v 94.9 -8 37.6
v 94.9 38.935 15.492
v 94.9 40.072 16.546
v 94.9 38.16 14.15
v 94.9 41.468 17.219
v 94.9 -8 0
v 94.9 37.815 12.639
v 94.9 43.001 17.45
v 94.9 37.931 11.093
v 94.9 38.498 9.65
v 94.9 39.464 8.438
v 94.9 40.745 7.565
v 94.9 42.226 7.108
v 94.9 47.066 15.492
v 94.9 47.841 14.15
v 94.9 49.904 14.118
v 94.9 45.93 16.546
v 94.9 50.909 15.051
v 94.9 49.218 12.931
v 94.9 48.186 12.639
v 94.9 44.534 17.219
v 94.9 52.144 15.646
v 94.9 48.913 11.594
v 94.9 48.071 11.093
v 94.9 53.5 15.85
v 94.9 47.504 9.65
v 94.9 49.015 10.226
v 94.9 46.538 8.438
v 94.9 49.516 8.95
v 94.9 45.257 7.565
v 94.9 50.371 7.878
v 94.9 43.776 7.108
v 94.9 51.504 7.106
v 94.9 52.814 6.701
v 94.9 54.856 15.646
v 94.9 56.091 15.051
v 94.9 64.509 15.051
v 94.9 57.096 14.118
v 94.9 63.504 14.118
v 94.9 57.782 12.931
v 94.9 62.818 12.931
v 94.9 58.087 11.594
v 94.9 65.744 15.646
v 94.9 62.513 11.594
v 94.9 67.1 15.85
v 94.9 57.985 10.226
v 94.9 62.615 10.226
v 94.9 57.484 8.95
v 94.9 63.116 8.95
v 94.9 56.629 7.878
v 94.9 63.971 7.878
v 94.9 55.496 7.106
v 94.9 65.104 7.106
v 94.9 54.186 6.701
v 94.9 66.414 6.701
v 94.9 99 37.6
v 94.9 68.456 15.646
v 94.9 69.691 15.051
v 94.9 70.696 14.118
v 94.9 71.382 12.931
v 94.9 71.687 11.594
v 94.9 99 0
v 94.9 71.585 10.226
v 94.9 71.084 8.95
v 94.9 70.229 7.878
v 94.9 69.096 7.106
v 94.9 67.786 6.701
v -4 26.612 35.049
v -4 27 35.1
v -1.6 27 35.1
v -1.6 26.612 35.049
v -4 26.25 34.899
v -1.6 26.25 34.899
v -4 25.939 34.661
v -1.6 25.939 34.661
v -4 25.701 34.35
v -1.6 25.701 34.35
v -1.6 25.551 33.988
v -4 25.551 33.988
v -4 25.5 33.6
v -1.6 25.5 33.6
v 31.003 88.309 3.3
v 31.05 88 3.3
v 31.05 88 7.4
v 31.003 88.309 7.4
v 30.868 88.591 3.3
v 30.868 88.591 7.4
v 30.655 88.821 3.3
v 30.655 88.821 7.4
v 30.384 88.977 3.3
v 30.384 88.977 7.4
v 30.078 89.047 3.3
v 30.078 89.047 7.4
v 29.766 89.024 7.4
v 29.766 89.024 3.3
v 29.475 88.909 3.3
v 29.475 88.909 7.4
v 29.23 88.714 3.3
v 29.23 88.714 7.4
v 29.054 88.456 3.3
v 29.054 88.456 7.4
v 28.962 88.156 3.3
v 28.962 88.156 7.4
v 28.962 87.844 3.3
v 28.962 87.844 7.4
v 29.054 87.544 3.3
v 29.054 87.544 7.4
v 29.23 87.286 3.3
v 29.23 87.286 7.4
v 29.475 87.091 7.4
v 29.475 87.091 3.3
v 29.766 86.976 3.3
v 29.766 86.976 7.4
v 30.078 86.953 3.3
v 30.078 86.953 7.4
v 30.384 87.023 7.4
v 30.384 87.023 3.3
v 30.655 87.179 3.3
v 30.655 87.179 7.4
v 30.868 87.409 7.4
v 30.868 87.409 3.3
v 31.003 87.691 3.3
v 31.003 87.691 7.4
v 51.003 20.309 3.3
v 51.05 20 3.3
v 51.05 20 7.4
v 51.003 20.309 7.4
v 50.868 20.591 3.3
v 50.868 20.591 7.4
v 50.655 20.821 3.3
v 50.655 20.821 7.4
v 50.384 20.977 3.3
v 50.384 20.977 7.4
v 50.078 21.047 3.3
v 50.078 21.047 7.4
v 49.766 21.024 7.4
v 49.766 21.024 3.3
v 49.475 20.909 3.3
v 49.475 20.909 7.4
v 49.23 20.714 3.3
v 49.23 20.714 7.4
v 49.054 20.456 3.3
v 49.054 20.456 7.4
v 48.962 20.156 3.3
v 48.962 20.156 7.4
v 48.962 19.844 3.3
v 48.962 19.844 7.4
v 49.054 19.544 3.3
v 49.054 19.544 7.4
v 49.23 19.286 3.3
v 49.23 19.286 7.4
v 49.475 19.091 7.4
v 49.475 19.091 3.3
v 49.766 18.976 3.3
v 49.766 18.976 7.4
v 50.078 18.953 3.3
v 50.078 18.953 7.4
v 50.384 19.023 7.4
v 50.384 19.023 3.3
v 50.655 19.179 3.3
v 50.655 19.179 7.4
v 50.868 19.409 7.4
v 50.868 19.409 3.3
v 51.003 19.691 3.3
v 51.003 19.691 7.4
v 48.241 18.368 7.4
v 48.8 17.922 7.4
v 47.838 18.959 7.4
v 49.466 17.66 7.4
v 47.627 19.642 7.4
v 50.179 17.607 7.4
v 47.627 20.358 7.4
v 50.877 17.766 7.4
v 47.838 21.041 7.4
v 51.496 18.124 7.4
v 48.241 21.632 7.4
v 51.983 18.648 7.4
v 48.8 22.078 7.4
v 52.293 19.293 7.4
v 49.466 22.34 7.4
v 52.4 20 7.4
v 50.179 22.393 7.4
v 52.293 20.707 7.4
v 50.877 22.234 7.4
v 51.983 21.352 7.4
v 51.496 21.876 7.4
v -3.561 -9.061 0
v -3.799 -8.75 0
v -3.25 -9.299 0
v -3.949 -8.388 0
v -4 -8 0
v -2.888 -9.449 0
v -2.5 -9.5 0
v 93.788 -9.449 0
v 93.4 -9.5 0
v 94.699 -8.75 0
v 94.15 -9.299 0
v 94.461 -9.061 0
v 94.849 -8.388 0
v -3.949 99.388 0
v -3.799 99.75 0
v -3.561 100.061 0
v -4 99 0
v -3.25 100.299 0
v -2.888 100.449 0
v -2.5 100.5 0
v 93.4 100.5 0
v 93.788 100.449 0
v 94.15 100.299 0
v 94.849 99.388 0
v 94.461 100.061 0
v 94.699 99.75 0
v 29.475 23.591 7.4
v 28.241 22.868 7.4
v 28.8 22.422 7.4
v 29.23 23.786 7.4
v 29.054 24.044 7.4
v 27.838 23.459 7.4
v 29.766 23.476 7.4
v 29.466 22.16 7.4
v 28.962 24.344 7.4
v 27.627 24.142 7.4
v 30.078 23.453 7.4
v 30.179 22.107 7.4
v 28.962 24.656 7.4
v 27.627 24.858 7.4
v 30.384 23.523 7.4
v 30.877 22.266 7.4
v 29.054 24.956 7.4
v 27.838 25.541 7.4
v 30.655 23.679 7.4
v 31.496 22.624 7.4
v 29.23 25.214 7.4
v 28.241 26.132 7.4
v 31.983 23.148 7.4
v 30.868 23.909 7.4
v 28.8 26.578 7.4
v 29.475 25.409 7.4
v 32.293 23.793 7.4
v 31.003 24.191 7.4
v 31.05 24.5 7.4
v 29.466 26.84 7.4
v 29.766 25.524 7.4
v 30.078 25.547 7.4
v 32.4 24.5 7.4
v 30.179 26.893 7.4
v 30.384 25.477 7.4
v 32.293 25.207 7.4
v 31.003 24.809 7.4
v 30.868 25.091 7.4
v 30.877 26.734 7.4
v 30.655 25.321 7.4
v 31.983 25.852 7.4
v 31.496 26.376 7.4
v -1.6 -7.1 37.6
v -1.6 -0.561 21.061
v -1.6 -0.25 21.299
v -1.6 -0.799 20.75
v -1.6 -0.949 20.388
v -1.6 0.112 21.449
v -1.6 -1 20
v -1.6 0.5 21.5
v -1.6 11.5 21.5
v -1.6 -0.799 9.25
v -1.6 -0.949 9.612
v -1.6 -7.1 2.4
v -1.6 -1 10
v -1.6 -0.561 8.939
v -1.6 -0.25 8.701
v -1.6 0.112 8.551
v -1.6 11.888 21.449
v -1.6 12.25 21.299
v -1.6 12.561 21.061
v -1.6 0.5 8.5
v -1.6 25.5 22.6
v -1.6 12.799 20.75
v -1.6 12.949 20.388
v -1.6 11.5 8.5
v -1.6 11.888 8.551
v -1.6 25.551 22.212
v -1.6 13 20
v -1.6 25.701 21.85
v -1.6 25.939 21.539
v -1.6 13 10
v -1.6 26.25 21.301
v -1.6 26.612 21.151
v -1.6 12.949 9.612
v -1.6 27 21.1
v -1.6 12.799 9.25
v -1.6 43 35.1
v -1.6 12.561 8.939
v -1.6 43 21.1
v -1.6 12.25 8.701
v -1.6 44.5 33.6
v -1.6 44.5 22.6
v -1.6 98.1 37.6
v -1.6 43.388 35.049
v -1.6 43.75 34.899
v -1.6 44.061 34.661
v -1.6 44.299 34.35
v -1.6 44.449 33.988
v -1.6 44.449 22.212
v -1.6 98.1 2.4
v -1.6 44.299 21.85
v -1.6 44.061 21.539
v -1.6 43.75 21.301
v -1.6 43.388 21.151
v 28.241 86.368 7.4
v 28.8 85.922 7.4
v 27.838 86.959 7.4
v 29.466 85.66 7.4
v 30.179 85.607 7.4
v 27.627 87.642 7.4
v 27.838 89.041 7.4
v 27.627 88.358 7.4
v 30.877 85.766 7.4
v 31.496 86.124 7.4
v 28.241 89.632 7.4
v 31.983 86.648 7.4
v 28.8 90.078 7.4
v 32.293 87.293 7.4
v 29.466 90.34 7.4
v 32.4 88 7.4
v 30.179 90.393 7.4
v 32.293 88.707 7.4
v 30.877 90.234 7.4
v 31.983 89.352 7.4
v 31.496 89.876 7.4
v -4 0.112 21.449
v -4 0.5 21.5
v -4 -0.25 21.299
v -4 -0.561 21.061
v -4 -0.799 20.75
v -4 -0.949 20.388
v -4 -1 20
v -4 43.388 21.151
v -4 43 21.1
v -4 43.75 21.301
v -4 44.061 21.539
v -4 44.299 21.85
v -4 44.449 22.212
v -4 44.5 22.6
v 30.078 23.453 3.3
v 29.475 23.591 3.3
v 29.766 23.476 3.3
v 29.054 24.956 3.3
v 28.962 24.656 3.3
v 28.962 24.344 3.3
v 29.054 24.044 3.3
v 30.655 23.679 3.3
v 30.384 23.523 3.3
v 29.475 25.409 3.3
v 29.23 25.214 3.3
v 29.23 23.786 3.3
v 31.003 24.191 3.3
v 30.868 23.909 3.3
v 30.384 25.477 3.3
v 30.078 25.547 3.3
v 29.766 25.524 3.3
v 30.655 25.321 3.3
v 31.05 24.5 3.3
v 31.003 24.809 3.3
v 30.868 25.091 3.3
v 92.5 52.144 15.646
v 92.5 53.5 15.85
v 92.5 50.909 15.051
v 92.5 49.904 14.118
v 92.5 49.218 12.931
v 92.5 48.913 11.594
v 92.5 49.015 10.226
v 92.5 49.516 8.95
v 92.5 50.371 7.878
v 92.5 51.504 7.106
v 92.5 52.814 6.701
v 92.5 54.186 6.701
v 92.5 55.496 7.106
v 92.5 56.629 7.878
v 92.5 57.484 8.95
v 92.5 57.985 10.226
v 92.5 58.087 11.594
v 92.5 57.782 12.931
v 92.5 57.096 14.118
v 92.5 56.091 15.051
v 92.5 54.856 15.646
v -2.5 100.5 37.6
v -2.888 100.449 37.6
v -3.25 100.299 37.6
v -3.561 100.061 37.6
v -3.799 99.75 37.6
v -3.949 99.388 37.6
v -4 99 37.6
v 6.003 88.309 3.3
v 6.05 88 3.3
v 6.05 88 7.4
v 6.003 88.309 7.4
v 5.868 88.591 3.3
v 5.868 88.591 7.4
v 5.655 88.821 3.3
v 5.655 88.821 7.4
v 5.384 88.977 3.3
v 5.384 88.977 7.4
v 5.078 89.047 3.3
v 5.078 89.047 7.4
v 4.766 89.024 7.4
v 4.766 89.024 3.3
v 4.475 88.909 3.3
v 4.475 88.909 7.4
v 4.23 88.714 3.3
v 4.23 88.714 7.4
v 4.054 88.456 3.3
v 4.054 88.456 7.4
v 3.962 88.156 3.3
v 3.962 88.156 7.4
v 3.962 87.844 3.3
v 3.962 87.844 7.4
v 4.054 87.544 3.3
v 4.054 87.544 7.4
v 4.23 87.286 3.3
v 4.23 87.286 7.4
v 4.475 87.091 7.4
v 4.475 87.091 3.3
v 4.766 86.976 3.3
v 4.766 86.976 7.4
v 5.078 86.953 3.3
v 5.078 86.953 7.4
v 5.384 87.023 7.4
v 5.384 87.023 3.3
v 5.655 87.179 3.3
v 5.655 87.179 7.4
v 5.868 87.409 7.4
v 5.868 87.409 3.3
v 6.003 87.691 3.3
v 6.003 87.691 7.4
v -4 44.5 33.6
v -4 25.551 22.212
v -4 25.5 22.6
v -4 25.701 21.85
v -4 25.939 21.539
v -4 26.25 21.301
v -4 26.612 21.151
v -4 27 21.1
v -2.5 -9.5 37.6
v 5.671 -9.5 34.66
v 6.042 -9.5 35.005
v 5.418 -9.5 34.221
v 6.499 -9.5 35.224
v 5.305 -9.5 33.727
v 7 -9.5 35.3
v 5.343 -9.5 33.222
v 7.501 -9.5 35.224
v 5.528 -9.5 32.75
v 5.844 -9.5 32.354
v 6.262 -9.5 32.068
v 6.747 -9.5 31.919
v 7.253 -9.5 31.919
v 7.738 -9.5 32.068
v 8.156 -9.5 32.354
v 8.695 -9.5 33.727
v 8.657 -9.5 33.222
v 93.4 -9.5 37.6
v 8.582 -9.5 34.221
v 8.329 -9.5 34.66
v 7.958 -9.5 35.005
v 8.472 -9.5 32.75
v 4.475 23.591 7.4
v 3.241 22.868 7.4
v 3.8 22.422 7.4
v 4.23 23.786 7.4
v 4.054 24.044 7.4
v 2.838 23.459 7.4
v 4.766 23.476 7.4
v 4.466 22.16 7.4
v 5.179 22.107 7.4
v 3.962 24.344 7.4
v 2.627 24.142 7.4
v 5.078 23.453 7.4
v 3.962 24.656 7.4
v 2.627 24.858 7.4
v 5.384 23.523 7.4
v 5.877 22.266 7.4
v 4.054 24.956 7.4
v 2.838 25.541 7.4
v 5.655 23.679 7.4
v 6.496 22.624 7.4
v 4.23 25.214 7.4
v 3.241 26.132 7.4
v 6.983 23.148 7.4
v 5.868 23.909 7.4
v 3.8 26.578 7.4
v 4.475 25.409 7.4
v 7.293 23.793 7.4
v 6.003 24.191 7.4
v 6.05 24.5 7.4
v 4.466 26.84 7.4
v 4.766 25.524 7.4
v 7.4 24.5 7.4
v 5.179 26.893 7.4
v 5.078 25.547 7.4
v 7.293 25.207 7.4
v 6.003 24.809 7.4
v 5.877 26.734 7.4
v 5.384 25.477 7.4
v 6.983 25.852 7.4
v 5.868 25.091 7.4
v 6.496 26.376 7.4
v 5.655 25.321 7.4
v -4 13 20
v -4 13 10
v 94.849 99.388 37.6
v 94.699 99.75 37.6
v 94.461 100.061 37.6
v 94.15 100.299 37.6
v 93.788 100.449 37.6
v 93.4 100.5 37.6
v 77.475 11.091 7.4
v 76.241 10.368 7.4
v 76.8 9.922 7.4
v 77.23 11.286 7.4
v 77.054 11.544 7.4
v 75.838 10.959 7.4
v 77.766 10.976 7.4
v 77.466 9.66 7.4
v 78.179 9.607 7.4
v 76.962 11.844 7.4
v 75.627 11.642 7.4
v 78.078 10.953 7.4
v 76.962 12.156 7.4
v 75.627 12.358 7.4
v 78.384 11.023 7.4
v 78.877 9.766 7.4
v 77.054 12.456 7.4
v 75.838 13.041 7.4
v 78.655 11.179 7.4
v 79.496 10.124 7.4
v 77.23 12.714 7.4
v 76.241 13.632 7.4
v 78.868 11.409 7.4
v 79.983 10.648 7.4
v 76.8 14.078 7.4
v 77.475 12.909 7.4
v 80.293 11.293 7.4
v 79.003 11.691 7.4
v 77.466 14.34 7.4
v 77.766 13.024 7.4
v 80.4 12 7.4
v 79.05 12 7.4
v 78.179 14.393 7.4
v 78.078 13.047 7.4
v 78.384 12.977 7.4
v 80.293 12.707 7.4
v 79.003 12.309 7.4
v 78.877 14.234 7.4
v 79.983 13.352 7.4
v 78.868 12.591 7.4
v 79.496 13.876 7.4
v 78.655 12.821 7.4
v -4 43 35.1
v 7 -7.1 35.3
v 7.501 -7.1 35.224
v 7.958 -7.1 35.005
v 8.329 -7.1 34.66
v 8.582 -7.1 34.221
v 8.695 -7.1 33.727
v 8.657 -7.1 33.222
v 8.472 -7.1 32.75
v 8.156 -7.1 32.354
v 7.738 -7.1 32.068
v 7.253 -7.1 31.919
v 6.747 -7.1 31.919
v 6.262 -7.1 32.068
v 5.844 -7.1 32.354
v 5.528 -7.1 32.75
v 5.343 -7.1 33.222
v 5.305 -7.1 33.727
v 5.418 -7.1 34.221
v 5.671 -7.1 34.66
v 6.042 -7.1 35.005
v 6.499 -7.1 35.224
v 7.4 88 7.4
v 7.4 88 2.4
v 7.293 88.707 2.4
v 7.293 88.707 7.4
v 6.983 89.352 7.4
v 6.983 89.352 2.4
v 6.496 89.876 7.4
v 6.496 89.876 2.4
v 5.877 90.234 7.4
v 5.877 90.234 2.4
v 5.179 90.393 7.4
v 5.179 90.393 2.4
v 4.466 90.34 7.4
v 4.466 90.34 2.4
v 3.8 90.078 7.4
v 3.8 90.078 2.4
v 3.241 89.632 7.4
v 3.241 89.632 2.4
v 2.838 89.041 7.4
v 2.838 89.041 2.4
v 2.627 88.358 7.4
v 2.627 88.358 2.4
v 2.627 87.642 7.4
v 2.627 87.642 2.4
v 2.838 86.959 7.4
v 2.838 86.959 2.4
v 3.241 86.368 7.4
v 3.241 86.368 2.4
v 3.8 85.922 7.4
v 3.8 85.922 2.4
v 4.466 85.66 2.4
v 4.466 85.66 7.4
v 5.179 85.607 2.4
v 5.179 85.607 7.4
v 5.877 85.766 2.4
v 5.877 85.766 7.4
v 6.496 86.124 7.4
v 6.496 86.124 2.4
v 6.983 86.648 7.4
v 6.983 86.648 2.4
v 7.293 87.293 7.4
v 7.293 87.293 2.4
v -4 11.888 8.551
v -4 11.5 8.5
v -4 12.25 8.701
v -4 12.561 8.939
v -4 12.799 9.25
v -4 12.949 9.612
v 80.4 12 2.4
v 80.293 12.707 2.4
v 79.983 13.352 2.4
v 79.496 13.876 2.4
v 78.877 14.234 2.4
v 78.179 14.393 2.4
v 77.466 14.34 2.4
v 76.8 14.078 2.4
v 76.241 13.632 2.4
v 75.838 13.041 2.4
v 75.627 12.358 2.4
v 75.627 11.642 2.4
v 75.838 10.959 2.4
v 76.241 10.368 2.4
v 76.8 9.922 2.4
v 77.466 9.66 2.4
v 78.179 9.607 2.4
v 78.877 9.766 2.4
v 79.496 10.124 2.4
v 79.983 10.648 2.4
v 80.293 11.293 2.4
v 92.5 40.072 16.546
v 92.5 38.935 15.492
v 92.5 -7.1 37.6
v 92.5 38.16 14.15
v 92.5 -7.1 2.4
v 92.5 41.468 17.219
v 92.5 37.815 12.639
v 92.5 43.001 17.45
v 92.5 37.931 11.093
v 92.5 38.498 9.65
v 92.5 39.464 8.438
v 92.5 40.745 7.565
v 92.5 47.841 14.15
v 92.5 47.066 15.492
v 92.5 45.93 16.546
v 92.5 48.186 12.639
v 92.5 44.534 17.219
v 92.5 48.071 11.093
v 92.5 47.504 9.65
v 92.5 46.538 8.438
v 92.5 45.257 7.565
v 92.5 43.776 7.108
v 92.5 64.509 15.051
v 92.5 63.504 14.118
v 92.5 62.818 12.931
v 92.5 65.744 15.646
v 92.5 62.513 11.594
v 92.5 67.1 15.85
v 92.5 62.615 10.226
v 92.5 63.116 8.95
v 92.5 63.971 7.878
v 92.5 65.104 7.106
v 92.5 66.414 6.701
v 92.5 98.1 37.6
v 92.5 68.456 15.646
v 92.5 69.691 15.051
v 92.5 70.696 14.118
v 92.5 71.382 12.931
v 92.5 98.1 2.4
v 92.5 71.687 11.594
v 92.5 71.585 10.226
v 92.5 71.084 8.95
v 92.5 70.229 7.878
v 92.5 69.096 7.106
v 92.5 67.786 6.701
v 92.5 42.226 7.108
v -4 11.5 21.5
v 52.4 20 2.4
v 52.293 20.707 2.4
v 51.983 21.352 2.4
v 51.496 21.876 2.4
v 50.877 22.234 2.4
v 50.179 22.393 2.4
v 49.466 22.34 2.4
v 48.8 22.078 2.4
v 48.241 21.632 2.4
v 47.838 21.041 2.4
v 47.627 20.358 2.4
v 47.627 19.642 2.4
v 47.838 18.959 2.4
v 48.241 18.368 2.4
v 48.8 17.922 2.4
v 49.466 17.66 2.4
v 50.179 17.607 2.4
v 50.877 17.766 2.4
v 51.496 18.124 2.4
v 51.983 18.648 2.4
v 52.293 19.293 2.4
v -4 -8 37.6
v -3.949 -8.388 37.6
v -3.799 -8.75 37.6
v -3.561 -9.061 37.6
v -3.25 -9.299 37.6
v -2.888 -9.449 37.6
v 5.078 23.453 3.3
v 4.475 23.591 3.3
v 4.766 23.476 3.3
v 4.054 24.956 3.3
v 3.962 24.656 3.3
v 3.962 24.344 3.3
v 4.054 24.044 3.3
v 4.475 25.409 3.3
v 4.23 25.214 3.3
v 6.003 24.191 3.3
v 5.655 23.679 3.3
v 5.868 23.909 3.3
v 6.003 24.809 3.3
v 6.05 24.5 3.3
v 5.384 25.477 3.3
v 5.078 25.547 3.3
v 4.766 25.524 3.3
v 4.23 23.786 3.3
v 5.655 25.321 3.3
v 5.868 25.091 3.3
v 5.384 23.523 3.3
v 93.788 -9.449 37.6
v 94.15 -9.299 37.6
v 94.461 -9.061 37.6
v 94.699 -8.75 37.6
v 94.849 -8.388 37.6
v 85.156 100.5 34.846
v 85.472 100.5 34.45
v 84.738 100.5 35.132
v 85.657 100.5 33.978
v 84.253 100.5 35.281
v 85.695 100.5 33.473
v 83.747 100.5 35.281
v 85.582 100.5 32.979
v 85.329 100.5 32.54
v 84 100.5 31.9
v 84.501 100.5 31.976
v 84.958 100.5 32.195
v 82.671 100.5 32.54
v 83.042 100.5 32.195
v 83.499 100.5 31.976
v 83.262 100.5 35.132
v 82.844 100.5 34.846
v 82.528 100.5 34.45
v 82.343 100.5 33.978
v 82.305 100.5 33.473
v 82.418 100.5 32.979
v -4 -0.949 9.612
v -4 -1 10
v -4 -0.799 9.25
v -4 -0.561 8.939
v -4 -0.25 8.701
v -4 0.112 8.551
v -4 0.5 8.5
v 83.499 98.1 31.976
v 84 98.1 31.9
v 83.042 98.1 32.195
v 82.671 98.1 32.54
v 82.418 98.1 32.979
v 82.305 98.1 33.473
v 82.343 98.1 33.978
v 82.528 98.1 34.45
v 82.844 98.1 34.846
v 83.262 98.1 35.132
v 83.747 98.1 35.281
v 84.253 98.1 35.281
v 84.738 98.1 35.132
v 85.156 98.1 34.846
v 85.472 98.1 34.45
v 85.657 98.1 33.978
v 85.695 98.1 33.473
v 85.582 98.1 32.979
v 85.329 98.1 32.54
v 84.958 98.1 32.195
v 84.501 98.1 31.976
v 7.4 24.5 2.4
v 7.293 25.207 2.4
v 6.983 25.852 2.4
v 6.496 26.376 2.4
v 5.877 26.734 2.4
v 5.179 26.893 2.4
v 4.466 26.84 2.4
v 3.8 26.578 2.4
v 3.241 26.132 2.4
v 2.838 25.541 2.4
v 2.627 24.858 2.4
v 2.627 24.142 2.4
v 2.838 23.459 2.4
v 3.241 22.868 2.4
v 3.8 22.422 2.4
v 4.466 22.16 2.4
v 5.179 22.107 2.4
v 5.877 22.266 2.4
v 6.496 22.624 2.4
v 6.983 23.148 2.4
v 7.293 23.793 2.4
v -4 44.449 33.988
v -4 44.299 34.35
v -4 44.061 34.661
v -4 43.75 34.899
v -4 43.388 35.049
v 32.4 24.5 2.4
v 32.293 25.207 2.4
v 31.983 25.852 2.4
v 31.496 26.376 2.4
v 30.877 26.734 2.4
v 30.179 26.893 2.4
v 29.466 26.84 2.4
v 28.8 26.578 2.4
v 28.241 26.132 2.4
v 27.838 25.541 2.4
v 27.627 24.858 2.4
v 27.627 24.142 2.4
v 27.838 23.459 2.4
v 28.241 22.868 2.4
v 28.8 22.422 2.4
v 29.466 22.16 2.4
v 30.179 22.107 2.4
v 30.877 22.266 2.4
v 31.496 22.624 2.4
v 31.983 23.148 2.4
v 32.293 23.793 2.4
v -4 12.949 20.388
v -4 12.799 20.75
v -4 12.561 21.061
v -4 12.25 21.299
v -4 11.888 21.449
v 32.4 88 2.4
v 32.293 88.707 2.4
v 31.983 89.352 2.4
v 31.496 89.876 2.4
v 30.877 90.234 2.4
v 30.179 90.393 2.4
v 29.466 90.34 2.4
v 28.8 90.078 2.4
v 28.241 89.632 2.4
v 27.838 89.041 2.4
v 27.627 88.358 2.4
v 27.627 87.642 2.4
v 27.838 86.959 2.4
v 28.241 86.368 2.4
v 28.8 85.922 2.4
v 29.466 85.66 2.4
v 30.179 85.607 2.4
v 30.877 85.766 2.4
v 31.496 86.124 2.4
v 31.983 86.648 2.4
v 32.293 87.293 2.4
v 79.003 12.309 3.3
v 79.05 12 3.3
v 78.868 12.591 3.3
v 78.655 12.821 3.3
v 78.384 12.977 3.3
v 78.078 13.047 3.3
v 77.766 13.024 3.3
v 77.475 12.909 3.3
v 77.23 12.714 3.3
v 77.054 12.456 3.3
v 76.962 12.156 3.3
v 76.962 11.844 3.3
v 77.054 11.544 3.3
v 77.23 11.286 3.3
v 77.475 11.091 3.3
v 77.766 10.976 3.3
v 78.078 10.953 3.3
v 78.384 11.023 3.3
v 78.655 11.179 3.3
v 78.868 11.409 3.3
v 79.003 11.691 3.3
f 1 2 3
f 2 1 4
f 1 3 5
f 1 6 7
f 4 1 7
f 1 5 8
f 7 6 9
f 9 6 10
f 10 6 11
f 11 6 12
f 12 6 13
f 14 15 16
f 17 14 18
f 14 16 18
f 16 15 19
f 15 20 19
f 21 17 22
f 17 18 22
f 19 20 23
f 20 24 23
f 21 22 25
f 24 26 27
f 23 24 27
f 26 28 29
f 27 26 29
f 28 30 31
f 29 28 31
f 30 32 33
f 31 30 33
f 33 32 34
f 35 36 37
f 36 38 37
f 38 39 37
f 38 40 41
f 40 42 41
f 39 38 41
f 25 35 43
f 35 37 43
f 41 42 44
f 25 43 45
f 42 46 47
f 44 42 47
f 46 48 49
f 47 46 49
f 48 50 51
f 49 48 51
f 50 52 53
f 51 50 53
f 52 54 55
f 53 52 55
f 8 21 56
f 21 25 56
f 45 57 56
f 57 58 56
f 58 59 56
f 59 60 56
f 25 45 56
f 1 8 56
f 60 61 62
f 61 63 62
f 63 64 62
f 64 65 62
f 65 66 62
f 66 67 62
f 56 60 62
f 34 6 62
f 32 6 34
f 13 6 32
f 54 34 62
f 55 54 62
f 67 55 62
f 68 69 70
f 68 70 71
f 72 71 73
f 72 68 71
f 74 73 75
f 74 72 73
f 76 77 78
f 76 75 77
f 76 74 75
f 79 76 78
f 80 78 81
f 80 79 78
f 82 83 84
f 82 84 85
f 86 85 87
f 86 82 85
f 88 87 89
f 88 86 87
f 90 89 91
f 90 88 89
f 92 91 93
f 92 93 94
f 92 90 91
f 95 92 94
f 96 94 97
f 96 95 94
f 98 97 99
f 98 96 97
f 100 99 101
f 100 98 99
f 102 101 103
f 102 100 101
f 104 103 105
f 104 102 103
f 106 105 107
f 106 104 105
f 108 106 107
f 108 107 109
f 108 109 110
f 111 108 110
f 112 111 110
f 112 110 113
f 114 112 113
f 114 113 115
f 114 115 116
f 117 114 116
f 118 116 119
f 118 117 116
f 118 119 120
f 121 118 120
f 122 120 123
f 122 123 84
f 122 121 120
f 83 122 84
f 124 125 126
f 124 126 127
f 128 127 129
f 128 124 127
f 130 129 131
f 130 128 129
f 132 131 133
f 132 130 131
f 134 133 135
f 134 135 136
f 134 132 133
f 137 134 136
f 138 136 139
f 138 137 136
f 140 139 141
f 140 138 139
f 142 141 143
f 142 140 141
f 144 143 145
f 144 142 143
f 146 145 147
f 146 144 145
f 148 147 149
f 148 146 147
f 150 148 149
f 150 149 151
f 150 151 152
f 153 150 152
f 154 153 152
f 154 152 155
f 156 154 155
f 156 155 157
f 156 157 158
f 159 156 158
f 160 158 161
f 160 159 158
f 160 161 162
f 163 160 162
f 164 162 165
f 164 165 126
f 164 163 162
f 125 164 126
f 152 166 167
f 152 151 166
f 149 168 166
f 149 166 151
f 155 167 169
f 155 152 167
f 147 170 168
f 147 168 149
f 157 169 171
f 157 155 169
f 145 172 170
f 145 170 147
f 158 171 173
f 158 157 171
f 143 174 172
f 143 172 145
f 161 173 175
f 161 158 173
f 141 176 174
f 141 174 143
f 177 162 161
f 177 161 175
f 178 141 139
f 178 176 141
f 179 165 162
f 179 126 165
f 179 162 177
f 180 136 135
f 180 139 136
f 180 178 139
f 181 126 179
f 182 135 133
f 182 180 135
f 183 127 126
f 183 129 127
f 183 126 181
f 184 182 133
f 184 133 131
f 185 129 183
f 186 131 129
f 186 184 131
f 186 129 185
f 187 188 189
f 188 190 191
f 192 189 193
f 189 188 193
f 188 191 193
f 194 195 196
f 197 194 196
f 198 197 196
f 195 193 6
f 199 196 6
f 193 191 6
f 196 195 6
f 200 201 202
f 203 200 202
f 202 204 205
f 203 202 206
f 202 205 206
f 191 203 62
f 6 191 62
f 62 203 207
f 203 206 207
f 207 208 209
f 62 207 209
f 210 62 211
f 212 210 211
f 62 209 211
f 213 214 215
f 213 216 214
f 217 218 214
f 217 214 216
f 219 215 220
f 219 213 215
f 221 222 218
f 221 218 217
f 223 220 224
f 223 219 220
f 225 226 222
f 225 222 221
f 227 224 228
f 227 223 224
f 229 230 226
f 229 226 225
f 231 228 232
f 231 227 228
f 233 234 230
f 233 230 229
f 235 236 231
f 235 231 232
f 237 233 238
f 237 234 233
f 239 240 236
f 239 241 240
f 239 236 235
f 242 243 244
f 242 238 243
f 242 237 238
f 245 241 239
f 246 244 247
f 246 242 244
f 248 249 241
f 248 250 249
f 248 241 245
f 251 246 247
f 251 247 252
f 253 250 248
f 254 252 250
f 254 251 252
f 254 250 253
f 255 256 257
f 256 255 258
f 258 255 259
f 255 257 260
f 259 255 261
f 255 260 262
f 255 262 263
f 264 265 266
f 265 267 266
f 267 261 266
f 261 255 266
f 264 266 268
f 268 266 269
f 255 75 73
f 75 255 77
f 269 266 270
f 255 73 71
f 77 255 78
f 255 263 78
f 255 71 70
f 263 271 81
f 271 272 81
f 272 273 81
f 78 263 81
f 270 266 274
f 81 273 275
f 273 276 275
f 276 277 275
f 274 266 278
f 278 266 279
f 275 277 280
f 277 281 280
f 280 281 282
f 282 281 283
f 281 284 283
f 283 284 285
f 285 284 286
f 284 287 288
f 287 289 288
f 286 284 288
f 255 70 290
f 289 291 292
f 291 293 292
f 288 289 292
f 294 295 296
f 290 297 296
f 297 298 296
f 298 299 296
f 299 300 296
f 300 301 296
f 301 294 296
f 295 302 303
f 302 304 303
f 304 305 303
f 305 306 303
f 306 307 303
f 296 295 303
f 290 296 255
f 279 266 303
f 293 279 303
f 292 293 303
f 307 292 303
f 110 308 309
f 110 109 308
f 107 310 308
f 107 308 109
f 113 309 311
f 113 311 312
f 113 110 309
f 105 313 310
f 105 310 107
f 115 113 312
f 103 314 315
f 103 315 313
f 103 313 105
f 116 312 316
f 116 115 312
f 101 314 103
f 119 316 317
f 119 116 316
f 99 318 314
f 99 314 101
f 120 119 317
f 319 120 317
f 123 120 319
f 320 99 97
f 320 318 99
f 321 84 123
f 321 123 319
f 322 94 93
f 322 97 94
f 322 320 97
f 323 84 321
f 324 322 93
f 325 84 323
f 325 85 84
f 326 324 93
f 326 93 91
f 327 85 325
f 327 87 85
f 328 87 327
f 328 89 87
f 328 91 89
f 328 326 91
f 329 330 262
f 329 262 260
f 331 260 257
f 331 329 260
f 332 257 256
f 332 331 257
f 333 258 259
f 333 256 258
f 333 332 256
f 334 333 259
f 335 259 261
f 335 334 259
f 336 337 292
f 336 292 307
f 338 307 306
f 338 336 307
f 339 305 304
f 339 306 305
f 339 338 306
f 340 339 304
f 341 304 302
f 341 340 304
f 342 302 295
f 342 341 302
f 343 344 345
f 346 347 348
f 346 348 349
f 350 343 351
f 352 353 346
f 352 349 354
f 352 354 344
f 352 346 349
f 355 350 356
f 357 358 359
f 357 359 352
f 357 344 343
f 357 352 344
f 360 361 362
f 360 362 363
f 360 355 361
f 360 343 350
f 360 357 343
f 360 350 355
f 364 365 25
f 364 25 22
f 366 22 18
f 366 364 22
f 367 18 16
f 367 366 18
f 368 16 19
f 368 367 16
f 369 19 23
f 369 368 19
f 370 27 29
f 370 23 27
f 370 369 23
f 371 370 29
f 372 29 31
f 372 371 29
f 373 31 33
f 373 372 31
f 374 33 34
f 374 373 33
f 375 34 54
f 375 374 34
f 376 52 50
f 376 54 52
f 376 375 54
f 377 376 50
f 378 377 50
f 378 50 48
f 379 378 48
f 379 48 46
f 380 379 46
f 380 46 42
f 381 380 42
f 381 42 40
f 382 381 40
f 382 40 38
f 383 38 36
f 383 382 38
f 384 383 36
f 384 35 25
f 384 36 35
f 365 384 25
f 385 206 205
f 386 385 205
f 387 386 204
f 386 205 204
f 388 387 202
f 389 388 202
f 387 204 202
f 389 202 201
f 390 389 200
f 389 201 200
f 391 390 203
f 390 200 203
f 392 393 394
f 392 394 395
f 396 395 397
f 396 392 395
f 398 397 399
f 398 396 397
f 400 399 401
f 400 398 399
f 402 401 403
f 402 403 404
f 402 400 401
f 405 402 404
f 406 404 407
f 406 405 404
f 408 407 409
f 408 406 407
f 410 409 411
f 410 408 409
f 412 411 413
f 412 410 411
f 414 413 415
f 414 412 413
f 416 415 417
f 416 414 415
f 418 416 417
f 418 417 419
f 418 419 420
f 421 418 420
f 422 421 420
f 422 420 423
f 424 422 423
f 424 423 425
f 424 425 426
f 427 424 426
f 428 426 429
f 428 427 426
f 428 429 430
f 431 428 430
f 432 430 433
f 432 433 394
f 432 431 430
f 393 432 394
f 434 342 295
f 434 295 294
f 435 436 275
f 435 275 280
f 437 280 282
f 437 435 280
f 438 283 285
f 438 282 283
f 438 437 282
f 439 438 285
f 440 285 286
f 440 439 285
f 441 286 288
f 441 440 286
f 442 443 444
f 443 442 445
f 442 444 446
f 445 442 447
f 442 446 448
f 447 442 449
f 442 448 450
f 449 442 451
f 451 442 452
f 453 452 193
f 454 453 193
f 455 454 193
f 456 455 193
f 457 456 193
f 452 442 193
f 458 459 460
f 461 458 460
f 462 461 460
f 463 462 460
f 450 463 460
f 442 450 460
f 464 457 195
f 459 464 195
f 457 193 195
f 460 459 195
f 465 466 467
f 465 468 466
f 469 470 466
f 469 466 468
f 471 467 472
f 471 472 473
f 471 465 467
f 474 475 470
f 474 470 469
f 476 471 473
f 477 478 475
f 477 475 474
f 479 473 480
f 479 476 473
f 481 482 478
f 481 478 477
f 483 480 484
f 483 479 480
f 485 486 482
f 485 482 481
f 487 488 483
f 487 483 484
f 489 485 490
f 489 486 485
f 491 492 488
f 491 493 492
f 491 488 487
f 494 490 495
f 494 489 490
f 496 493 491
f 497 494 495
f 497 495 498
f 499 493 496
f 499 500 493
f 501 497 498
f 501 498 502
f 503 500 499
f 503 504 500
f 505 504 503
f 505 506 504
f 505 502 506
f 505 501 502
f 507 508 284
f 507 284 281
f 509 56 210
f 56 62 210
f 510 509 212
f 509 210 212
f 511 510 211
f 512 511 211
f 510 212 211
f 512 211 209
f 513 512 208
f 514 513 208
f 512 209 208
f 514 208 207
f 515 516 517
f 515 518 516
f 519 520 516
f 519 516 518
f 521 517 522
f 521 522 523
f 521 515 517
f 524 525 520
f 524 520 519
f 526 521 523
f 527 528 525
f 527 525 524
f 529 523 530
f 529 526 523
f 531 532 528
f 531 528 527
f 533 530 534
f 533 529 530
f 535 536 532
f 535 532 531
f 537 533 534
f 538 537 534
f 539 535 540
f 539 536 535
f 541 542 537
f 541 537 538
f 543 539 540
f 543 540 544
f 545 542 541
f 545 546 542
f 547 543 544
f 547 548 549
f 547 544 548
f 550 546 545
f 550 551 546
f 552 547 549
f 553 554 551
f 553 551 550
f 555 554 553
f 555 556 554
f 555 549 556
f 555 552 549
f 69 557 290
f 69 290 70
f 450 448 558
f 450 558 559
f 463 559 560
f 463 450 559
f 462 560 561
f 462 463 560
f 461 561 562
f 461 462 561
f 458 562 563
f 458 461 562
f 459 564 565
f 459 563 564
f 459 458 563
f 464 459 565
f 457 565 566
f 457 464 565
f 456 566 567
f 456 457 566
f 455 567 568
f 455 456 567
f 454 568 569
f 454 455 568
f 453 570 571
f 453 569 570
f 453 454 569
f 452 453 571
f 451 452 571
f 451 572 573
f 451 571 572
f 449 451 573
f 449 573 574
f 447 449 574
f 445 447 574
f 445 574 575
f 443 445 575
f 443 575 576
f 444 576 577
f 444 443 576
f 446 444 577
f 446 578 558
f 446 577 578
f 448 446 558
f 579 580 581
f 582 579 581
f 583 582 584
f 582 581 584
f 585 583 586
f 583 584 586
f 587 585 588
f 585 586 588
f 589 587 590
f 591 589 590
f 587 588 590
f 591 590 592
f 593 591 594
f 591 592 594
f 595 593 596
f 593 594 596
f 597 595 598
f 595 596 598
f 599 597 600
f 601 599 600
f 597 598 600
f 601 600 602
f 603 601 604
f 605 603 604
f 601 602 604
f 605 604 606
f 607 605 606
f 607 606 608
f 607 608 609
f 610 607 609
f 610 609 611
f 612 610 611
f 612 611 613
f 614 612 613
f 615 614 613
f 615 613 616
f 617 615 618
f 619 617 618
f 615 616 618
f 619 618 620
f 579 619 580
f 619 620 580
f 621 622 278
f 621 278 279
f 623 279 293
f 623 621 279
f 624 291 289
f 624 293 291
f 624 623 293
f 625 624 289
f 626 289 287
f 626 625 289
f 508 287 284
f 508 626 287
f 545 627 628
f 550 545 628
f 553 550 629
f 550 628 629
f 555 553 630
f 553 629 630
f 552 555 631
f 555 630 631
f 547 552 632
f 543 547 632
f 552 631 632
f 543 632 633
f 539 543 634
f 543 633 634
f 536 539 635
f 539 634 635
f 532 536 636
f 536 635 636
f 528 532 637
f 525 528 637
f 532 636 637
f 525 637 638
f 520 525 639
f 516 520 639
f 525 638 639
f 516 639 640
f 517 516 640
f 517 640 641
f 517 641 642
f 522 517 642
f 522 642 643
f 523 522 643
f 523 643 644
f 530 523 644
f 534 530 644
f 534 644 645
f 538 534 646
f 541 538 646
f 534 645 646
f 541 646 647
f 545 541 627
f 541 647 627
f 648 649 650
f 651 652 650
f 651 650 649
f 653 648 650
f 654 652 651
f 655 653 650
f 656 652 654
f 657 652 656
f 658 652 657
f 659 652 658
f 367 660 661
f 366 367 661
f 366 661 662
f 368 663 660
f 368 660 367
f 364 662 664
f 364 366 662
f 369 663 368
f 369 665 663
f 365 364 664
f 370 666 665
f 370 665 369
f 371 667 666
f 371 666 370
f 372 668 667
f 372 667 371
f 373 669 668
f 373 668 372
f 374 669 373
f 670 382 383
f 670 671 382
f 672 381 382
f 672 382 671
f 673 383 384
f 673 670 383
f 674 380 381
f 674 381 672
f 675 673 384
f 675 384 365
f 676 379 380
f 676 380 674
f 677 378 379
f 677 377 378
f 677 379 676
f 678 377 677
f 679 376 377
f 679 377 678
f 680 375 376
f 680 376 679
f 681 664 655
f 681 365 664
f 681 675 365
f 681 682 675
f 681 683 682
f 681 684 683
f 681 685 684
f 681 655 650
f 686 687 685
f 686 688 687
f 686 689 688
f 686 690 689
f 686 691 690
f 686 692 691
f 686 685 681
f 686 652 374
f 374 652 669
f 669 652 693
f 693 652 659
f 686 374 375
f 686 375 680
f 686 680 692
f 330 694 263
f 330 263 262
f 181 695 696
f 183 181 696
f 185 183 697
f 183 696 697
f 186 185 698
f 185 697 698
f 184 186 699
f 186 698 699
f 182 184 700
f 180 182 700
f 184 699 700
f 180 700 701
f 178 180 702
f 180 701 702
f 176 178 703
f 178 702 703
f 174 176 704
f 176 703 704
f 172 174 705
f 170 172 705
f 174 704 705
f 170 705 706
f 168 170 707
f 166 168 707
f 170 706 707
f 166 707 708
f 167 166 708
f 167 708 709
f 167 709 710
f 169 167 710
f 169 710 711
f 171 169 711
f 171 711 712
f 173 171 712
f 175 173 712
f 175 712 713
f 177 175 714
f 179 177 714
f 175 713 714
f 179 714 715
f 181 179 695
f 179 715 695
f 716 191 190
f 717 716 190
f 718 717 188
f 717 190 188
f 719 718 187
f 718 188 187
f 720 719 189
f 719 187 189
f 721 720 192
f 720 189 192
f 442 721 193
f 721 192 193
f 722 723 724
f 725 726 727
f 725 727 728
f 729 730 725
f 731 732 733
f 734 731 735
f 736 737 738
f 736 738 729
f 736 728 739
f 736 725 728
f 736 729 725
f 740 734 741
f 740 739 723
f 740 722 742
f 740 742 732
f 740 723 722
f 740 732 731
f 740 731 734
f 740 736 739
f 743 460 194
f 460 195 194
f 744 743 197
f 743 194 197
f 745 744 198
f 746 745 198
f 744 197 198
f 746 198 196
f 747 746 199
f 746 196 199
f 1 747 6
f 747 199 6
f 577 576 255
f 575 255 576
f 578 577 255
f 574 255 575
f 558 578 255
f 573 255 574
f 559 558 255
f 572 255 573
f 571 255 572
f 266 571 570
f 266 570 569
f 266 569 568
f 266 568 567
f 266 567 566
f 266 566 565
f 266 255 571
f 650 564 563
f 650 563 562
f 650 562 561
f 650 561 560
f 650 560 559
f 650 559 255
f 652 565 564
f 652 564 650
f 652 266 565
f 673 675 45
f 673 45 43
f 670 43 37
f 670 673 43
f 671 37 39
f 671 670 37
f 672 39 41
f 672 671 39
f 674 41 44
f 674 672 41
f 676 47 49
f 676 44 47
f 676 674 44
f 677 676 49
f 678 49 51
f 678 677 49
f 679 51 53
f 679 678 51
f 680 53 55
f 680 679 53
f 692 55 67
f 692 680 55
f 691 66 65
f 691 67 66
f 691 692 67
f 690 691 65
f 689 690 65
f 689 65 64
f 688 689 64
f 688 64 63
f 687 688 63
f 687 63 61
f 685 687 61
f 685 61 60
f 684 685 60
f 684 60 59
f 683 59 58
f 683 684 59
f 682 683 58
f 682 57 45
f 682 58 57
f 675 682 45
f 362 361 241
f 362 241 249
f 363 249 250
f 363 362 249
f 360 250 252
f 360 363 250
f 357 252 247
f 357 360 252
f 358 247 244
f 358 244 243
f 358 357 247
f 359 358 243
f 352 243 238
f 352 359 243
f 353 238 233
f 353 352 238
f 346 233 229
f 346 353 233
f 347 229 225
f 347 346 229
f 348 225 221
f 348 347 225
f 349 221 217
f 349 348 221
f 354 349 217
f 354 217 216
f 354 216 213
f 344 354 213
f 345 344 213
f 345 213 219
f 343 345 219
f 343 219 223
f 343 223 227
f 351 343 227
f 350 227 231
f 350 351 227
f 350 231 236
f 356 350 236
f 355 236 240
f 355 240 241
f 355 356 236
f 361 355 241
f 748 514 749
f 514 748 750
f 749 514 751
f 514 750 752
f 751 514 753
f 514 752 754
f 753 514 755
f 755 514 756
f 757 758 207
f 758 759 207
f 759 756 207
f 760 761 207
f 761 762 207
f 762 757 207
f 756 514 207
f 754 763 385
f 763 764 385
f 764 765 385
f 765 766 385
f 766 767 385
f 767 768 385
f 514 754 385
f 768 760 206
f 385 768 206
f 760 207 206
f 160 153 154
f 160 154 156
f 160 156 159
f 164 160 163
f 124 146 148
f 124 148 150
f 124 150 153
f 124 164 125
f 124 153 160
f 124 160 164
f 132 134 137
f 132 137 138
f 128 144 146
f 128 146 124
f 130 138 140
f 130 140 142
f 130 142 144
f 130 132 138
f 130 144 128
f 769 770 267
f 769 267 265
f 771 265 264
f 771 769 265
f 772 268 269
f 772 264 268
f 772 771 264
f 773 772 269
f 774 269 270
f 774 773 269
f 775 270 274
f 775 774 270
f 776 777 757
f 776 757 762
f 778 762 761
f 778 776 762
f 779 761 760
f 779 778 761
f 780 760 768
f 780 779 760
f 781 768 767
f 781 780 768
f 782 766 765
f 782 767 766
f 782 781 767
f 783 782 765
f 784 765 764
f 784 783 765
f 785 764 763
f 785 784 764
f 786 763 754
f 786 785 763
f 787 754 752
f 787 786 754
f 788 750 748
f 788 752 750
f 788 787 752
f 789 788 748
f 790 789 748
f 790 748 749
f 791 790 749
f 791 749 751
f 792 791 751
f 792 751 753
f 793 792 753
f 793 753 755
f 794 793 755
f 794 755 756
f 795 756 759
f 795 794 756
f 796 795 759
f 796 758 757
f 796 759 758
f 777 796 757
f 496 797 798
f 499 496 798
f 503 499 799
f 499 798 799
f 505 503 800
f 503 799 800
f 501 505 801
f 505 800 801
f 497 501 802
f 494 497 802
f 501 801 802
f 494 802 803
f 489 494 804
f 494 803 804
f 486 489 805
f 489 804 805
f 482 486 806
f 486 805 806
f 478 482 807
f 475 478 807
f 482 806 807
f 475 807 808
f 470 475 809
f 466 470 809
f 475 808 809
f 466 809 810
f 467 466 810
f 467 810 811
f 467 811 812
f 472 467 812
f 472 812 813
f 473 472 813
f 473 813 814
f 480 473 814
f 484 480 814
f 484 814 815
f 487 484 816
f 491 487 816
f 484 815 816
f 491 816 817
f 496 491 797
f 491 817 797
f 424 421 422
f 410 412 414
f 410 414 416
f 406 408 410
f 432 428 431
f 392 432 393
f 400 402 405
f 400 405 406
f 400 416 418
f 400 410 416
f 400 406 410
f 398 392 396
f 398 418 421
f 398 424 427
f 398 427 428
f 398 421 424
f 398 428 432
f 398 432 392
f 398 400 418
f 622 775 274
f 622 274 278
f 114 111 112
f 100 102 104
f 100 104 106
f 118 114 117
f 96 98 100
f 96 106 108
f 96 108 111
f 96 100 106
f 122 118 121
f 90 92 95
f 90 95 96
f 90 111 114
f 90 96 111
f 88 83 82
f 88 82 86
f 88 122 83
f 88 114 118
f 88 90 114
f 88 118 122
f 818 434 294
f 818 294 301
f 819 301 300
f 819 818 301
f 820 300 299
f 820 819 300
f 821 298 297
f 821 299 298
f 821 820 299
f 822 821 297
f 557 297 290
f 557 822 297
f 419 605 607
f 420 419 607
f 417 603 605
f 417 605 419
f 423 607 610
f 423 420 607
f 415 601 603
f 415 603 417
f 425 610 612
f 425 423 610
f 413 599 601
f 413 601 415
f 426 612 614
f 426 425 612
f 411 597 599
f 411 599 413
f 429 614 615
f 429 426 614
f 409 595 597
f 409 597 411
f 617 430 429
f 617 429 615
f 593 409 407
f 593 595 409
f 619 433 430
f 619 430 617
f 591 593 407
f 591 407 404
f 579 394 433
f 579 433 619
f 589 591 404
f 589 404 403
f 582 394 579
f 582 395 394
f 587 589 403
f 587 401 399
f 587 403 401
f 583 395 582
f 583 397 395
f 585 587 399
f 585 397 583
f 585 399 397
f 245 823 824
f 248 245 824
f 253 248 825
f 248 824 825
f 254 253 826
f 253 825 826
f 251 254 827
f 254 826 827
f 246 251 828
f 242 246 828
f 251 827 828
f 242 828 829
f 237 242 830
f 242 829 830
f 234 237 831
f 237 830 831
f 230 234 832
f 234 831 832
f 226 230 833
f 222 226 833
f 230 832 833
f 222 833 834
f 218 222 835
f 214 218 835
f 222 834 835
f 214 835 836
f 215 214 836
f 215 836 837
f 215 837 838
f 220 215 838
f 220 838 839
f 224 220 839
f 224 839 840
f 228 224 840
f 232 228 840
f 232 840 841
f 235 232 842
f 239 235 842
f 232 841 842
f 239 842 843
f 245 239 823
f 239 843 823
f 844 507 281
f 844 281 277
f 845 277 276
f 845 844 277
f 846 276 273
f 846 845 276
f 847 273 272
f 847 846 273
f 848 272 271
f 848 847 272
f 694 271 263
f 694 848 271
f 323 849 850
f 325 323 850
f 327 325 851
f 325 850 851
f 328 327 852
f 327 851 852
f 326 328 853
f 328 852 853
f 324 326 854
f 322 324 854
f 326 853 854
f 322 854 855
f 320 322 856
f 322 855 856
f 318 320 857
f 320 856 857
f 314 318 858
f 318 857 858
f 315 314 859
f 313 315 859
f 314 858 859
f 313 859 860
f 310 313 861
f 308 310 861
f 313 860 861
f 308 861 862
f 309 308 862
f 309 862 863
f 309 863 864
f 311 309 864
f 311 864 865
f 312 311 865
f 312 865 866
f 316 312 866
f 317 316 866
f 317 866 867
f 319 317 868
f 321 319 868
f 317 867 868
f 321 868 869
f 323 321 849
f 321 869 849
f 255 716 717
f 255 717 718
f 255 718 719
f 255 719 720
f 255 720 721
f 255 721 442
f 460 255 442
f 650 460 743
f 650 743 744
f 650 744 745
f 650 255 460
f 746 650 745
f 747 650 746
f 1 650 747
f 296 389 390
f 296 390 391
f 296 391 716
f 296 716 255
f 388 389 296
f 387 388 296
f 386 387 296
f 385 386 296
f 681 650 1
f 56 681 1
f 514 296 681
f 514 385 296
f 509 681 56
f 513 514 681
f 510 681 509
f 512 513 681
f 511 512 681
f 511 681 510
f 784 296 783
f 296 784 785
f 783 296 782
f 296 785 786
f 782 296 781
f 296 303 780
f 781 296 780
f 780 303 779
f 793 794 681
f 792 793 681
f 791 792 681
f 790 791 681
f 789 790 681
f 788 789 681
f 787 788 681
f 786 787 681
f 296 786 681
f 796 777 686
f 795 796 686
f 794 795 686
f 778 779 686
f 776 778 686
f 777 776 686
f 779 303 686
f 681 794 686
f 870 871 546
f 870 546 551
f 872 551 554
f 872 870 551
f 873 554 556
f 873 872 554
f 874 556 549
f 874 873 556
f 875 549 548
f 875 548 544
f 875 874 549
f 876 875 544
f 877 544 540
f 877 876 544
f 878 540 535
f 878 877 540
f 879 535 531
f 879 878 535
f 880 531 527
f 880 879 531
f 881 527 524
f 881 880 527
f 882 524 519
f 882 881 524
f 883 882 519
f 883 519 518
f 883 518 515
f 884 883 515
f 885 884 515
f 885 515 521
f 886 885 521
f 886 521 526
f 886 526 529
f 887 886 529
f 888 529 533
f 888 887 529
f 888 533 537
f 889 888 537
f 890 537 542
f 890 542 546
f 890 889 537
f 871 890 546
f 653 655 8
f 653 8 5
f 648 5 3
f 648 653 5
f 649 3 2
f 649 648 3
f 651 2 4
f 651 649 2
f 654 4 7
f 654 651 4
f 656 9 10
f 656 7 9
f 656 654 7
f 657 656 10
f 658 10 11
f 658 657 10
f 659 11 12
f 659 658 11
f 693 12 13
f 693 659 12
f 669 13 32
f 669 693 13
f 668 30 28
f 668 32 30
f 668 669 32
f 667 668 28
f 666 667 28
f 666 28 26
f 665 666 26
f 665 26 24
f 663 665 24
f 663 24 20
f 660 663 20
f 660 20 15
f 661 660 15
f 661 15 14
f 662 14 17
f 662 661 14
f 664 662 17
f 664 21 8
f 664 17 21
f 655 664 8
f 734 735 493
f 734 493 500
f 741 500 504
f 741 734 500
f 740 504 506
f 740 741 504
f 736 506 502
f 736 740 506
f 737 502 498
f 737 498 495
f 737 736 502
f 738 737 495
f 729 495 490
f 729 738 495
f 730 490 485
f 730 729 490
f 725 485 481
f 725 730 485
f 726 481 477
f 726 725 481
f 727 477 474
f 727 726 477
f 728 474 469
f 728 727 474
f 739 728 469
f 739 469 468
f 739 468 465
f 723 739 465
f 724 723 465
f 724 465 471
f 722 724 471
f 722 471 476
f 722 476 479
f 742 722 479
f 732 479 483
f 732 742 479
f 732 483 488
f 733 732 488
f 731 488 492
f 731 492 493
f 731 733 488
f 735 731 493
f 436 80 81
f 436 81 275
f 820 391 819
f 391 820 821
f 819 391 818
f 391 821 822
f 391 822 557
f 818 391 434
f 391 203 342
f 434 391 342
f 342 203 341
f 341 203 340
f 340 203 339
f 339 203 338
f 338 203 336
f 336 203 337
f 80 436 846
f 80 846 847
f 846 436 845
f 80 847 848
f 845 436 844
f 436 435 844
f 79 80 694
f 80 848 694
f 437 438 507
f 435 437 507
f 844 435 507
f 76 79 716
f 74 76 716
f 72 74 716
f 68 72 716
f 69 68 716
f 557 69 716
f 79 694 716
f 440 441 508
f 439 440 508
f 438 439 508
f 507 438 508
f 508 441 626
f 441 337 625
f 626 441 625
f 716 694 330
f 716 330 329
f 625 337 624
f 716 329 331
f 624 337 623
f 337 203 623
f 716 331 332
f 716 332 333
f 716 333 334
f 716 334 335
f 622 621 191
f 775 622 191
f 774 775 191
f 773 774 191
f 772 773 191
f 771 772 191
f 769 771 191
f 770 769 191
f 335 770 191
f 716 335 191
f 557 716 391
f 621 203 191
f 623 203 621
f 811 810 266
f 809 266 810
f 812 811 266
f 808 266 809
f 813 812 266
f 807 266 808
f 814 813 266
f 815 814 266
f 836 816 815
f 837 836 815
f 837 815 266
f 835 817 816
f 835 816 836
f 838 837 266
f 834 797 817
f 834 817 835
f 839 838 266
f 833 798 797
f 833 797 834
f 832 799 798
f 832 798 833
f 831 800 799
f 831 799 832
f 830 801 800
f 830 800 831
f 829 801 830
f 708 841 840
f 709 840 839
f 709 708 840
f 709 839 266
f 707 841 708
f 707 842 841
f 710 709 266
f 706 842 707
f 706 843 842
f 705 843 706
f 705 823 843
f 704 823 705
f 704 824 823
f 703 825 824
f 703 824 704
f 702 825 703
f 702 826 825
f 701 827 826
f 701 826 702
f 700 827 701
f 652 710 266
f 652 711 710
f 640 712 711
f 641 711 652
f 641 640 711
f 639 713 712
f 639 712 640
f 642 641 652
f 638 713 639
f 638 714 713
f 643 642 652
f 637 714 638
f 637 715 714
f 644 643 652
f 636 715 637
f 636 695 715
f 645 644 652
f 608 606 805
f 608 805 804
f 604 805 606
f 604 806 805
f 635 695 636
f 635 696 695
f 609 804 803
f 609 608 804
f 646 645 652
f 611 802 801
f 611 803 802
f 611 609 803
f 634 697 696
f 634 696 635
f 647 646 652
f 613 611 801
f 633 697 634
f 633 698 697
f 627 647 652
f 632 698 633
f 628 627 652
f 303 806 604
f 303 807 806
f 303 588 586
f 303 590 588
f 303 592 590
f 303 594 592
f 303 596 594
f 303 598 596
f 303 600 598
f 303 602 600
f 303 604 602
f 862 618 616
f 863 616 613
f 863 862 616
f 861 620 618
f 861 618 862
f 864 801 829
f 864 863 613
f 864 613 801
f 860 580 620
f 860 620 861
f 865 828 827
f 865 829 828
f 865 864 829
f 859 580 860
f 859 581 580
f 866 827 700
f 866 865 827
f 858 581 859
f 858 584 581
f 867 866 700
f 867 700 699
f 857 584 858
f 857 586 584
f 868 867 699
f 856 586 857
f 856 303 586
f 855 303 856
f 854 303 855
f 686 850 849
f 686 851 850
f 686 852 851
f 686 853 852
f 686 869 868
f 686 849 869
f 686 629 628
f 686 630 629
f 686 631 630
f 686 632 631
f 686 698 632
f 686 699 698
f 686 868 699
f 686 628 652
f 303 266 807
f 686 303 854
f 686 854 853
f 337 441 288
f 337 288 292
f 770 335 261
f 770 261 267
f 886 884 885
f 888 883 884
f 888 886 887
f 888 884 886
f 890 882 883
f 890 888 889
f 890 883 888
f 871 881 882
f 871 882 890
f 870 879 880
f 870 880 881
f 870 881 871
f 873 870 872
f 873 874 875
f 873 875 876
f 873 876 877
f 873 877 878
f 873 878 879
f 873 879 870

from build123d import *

# Parameters (mm, degrees)
FLOOR_2P4MM_DEPTH                         = 2.4
SIX_PCB_SUPPORTS_5MM_START                = 2.4
SKETCH_2_R                                = 2.4
SIX_PCB_SUPPORTS_5MM_DEPTH                = 5
INTEGRAL_FRONT_REAR_AND_SIDE_WALLS_START  = 2.4
SKETCH_3_W                                = 94.1
SKETCH_3_H                                = 105.2
INTEGRAL_FRONT_REAR_AND_SIDE_WALLS_DEPTH  = 35.2
SIX_BLIND_M2P5_STANDOFF_PILOTS_DEPTH      = 2.05
SIX_BLIND_M2P5_STANDOFF_PILOTS_DEPTH_BACK = 2.05
SIX_BLIND_M2P5_STANDOFF_PILOTS_START      = 5.35
SKETCH_4_R                                = 1.05
SIDE_LID_SCREW_1_DEPTH                    = 1.25
SIDE_LID_SCREW_1_DEPTH_BACK               = 1.25
SIDE_LID_SCREW_1_START                    = -8.3
SKETCH_5_R                                = 1.7
SIDE_LID_SCREW_2_DEPTH                    = 1.25
SIDE_LID_SCREW_2_DEPTH_BACK               = 1.25
SIDE_LID_SCREW_2_START                    = 99.3
SKETCH_6_R                                = 1.7
FRONT_AUDIO_ACCESS_DEPTH                  = 1.25
FRONT_AUDIO_ACCESS_DEPTH_BACK             = 1.25
FRONT_AUDIO_ACCESS_START                  = 93.7
SKETCH_7_R                                = 5.2
SKETCH_7_R_2                              = 4.6
REAR_DC_AND_USB_ACCESS_DEPTH              = 1.25
REAR_DC_AND_USB_ACCESS_DEPTH_BACK         = 1.25
REAR_DC_AND_USB_ACCESS_START              = -2.8


with BuildPart() as part:
    # 草图1 → Floor_2p4mm (new body)
    with BuildSketch(Plane.XY):
        with BuildLine():
            Line((-2.5, -9.5), (93.4, -9.5))
            ThreePointArc((93.4, -9.5), (94.460660172, -9.060660172), (94.9, -8))
            Line((94.9, -8), (94.9, 99))
            ThreePointArc((94.9, 99), (94.460660172, 100.060660172), (93.4, 100.5))
            Line((93.4, 100.5), (-2.5, 100.5))
            ThreePointArc((-2.5, 100.5), (-3.560660172, 100.060660172), (-4, 99))
            Line((-4, 99), (-4, -8))
            ThreePointArc((-4, -8), (-3.560660172, -9.060660172), (-2.5, -9.5))
        make_face()
    extrude(amount=FLOOR_2P4MM_DEPTH)

    # 草图2 → Six_PCB_supports_5mm (add)
    with BuildSketch(Plane.XY.offset(SIX_PCB_SUPPORTS_5MM_START)):
        with Locations((5, 24.5)):
            Circle(SKETCH_2_R)
        with Locations((5, 88)):
            Circle(SKETCH_2_R)
        with Locations((30, 24.5)):
            Circle(SKETCH_2_R)
        with Locations((30, 88)):
            Circle(SKETCH_2_R)
        with Locations((78, 12)):
            Circle(SKETCH_2_R)
        with Locations((50, 20)):
            Circle(SKETCH_2_R)
    extrude(amount=SIX_PCB_SUPPORTS_5MM_DEPTH)

    # 草图3 → Integral_front_rear_and_side_walls (add)
    with BuildSketch(Plane.XY.offset(INTEGRAL_FRONT_REAR_AND_SIDE_WALLS_START)):
        with BuildLine():
            Line((-2.5, -9.5), (93.4, -9.5))
            ThreePointArc((93.4, -9.5), (94.460660172, -9.060660172), (94.9, -8))
            Line((94.9, -8), (94.9, 99))
            ThreePointArc((94.9, 99), (94.460660172, 100.060660172), (93.4, 100.5))
            Line((93.4, 100.5), (-2.5, 100.5))
            ThreePointArc((-2.5, 100.5), (-3.560660172, 100.060660172), (-4, 99))
            Line((-4, 99), (-4, -8))
            ThreePointArc((-4, -8), (-3.560660172, -9.060660172), (-2.5, -9.5))
        make_face()
        with Locations((45.45, 45.5)):
            Rectangle(SKETCH_3_W, SKETCH_3_H, mode=Mode.SUBTRACT)
    extrude(amount=INTEGRAL_FRONT_REAR_AND_SIDE_WALLS_DEPTH)

    # 草图4 → Six_blind_M2p5_standoff_pilots (cut, two sides: drawn at the far end of the back side and taken through both)
    with BuildSketch(Plane.XY.offset(SIX_BLIND_M2P5_STANDOFF_PILOTS_START - SIX_BLIND_M2P5_STANDOFF_PILOTS_DEPTH_BACK)):
        with Locations((5, 24.5)):
            Circle(SKETCH_4_R)
        with Locations((5, 88)):
            Circle(SKETCH_4_R)
        with Locations((30, 24.5)):
            Circle(SKETCH_4_R)
        with Locations((30, 88)):
            Circle(SKETCH_4_R)
        with Locations((78, 12)):
            Circle(SKETCH_4_R)
        with Locations((50, 20)):
            Circle(SKETCH_4_R)
    extrude(amount=SIX_BLIND_M2P5_STANDOFF_PILOTS_DEPTH + SIX_BLIND_M2P5_STANDOFF_PILOTS_DEPTH_BACK, mode=Mode.SUBTRACT)

    # 草图5 → Side_lid_screw_1 (cut, two sides: drawn at the far end of the back side and taken through both)
    with BuildSketch(Plane(origin=(0, 0, 0), x_dir=(1, 0, 0), z_dir=(0, 1, 0)).offset(SIDE_LID_SCREW_1_START - SIDE_LID_SCREW_1_DEPTH_BACK)):
        with Locations(Location((7, -33.6, 0), (0, 0, 270))):
            Circle(SKETCH_5_R)
    extrude(amount=SIDE_LID_SCREW_1_DEPTH + SIDE_LID_SCREW_1_DEPTH_BACK, mode=Mode.SUBTRACT)

    # 草图6 → Side_lid_screw_2 (cut, two sides: drawn at the far end of the back side and taken through both)
    with BuildSketch(Plane(origin=(0, 0, 0), x_dir=(1, 0, 0), z_dir=(0, 1, 0)).offset(SIDE_LID_SCREW_2_START - SIDE_LID_SCREW_2_DEPTH_BACK)):
        with Locations(Location((84, -33.6, 0), (0, 0, 90))):
            Circle(SKETCH_6_R)
    extrude(amount=SIDE_LID_SCREW_2_DEPTH + SIDE_LID_SCREW_2_DEPTH_BACK, mode=Mode.SUBTRACT)

    # 草图7 → Front_audio_access (cut, two sides: drawn at the far end of the back side and taken through both)
    with BuildSketch(Plane(origin=(0, 0, 0), x_dir=(0, 0, -1), z_dir=(1, 0, 0)).offset(FRONT_AUDIO_ACCESS_START - FRONT_AUDIO_ACCESS_DEPTH_BACK)):
        with Locations(Location((-12.25, 43.0009, 0), (0, 0, 180))):
            Circle(SKETCH_7_R)
        with Locations(Location((-11.25, 53.5, 0), (0, 0, 180))):
            Circle(SKETCH_7_R_2)
        with Locations(Location((-11.25, 67.1, 0), (0, 0, 180))):
            Circle(SKETCH_7_R_2)
    extrude(amount=FRONT_AUDIO_ACCESS_DEPTH + FRONT_AUDIO_ACCESS_DEPTH_BACK, mode=Mode.SUBTRACT)

    # 草图8 → Rear_DC_and_USB_access (cut, two sides: drawn at the far end of the back side and taken through both)
    with BuildSketch(Plane(origin=(0, 0, 0), x_dir=(0, 0, -1), z_dir=(1, 0, 0)).offset(REAR_DC_AND_USB_ACCESS_START - REAR_DC_AND_USB_ACCESS_DEPTH_BACK)):
        with BuildLine():
            Line((-8.5, 0.5), (-8.5, 11.5))
            ThreePointArc((-8.5, 11.5), (-8.939339828, 12.560660172), (-10, 13))
            Line((-10, 13), (-20, 13))
            ThreePointArc((-20, 13), (-21.060660172, 12.560660172), (-21.5, 11.5))
            Line((-21.5, 11.5), (-21.5, 0.5))
            ThreePointArc((-21.5, 0.5), (-21.060660172, -0.560660172), (-20, -1))
            Line((-20, -1), (-10, -1))
            ThreePointArc((-10, -1), (-8.939339828, -0.560660172), (-8.5, 0.5))
        make_face()
        with BuildLine():
            Line((-21.1, 27), (-21.1, 43))
            ThreePointArc((-21.1, 43), (-21.539339828, 44.060660172), (-22.6, 44.5))
            Line((-22.6, 44.5), (-33.6, 44.5))
            ThreePointArc((-33.6, 44.5), (-34.660660172, 44.060660172), (-35.1, 43))
            Line((-35.1, 43), (-35.1, 27))
            ThreePointArc((-35.1, 27), (-34.660660172, 25.939339828), (-33.6, 25.5))
            Line((-33.6, 25.5), (-22.6, 25.5))
            ThreePointArc((-22.6, 25.5), (-21.539339828, 25.939339828), (-21.1, 27))
        make_face()
    extrude(amount=REAR_DC_AND_USB_ACCESS_DEPTH + REAR_DC_AND_USB_ACCESS_DEPTH_BACK, mode=Mode.SUBTRACT)


solid = part.part
